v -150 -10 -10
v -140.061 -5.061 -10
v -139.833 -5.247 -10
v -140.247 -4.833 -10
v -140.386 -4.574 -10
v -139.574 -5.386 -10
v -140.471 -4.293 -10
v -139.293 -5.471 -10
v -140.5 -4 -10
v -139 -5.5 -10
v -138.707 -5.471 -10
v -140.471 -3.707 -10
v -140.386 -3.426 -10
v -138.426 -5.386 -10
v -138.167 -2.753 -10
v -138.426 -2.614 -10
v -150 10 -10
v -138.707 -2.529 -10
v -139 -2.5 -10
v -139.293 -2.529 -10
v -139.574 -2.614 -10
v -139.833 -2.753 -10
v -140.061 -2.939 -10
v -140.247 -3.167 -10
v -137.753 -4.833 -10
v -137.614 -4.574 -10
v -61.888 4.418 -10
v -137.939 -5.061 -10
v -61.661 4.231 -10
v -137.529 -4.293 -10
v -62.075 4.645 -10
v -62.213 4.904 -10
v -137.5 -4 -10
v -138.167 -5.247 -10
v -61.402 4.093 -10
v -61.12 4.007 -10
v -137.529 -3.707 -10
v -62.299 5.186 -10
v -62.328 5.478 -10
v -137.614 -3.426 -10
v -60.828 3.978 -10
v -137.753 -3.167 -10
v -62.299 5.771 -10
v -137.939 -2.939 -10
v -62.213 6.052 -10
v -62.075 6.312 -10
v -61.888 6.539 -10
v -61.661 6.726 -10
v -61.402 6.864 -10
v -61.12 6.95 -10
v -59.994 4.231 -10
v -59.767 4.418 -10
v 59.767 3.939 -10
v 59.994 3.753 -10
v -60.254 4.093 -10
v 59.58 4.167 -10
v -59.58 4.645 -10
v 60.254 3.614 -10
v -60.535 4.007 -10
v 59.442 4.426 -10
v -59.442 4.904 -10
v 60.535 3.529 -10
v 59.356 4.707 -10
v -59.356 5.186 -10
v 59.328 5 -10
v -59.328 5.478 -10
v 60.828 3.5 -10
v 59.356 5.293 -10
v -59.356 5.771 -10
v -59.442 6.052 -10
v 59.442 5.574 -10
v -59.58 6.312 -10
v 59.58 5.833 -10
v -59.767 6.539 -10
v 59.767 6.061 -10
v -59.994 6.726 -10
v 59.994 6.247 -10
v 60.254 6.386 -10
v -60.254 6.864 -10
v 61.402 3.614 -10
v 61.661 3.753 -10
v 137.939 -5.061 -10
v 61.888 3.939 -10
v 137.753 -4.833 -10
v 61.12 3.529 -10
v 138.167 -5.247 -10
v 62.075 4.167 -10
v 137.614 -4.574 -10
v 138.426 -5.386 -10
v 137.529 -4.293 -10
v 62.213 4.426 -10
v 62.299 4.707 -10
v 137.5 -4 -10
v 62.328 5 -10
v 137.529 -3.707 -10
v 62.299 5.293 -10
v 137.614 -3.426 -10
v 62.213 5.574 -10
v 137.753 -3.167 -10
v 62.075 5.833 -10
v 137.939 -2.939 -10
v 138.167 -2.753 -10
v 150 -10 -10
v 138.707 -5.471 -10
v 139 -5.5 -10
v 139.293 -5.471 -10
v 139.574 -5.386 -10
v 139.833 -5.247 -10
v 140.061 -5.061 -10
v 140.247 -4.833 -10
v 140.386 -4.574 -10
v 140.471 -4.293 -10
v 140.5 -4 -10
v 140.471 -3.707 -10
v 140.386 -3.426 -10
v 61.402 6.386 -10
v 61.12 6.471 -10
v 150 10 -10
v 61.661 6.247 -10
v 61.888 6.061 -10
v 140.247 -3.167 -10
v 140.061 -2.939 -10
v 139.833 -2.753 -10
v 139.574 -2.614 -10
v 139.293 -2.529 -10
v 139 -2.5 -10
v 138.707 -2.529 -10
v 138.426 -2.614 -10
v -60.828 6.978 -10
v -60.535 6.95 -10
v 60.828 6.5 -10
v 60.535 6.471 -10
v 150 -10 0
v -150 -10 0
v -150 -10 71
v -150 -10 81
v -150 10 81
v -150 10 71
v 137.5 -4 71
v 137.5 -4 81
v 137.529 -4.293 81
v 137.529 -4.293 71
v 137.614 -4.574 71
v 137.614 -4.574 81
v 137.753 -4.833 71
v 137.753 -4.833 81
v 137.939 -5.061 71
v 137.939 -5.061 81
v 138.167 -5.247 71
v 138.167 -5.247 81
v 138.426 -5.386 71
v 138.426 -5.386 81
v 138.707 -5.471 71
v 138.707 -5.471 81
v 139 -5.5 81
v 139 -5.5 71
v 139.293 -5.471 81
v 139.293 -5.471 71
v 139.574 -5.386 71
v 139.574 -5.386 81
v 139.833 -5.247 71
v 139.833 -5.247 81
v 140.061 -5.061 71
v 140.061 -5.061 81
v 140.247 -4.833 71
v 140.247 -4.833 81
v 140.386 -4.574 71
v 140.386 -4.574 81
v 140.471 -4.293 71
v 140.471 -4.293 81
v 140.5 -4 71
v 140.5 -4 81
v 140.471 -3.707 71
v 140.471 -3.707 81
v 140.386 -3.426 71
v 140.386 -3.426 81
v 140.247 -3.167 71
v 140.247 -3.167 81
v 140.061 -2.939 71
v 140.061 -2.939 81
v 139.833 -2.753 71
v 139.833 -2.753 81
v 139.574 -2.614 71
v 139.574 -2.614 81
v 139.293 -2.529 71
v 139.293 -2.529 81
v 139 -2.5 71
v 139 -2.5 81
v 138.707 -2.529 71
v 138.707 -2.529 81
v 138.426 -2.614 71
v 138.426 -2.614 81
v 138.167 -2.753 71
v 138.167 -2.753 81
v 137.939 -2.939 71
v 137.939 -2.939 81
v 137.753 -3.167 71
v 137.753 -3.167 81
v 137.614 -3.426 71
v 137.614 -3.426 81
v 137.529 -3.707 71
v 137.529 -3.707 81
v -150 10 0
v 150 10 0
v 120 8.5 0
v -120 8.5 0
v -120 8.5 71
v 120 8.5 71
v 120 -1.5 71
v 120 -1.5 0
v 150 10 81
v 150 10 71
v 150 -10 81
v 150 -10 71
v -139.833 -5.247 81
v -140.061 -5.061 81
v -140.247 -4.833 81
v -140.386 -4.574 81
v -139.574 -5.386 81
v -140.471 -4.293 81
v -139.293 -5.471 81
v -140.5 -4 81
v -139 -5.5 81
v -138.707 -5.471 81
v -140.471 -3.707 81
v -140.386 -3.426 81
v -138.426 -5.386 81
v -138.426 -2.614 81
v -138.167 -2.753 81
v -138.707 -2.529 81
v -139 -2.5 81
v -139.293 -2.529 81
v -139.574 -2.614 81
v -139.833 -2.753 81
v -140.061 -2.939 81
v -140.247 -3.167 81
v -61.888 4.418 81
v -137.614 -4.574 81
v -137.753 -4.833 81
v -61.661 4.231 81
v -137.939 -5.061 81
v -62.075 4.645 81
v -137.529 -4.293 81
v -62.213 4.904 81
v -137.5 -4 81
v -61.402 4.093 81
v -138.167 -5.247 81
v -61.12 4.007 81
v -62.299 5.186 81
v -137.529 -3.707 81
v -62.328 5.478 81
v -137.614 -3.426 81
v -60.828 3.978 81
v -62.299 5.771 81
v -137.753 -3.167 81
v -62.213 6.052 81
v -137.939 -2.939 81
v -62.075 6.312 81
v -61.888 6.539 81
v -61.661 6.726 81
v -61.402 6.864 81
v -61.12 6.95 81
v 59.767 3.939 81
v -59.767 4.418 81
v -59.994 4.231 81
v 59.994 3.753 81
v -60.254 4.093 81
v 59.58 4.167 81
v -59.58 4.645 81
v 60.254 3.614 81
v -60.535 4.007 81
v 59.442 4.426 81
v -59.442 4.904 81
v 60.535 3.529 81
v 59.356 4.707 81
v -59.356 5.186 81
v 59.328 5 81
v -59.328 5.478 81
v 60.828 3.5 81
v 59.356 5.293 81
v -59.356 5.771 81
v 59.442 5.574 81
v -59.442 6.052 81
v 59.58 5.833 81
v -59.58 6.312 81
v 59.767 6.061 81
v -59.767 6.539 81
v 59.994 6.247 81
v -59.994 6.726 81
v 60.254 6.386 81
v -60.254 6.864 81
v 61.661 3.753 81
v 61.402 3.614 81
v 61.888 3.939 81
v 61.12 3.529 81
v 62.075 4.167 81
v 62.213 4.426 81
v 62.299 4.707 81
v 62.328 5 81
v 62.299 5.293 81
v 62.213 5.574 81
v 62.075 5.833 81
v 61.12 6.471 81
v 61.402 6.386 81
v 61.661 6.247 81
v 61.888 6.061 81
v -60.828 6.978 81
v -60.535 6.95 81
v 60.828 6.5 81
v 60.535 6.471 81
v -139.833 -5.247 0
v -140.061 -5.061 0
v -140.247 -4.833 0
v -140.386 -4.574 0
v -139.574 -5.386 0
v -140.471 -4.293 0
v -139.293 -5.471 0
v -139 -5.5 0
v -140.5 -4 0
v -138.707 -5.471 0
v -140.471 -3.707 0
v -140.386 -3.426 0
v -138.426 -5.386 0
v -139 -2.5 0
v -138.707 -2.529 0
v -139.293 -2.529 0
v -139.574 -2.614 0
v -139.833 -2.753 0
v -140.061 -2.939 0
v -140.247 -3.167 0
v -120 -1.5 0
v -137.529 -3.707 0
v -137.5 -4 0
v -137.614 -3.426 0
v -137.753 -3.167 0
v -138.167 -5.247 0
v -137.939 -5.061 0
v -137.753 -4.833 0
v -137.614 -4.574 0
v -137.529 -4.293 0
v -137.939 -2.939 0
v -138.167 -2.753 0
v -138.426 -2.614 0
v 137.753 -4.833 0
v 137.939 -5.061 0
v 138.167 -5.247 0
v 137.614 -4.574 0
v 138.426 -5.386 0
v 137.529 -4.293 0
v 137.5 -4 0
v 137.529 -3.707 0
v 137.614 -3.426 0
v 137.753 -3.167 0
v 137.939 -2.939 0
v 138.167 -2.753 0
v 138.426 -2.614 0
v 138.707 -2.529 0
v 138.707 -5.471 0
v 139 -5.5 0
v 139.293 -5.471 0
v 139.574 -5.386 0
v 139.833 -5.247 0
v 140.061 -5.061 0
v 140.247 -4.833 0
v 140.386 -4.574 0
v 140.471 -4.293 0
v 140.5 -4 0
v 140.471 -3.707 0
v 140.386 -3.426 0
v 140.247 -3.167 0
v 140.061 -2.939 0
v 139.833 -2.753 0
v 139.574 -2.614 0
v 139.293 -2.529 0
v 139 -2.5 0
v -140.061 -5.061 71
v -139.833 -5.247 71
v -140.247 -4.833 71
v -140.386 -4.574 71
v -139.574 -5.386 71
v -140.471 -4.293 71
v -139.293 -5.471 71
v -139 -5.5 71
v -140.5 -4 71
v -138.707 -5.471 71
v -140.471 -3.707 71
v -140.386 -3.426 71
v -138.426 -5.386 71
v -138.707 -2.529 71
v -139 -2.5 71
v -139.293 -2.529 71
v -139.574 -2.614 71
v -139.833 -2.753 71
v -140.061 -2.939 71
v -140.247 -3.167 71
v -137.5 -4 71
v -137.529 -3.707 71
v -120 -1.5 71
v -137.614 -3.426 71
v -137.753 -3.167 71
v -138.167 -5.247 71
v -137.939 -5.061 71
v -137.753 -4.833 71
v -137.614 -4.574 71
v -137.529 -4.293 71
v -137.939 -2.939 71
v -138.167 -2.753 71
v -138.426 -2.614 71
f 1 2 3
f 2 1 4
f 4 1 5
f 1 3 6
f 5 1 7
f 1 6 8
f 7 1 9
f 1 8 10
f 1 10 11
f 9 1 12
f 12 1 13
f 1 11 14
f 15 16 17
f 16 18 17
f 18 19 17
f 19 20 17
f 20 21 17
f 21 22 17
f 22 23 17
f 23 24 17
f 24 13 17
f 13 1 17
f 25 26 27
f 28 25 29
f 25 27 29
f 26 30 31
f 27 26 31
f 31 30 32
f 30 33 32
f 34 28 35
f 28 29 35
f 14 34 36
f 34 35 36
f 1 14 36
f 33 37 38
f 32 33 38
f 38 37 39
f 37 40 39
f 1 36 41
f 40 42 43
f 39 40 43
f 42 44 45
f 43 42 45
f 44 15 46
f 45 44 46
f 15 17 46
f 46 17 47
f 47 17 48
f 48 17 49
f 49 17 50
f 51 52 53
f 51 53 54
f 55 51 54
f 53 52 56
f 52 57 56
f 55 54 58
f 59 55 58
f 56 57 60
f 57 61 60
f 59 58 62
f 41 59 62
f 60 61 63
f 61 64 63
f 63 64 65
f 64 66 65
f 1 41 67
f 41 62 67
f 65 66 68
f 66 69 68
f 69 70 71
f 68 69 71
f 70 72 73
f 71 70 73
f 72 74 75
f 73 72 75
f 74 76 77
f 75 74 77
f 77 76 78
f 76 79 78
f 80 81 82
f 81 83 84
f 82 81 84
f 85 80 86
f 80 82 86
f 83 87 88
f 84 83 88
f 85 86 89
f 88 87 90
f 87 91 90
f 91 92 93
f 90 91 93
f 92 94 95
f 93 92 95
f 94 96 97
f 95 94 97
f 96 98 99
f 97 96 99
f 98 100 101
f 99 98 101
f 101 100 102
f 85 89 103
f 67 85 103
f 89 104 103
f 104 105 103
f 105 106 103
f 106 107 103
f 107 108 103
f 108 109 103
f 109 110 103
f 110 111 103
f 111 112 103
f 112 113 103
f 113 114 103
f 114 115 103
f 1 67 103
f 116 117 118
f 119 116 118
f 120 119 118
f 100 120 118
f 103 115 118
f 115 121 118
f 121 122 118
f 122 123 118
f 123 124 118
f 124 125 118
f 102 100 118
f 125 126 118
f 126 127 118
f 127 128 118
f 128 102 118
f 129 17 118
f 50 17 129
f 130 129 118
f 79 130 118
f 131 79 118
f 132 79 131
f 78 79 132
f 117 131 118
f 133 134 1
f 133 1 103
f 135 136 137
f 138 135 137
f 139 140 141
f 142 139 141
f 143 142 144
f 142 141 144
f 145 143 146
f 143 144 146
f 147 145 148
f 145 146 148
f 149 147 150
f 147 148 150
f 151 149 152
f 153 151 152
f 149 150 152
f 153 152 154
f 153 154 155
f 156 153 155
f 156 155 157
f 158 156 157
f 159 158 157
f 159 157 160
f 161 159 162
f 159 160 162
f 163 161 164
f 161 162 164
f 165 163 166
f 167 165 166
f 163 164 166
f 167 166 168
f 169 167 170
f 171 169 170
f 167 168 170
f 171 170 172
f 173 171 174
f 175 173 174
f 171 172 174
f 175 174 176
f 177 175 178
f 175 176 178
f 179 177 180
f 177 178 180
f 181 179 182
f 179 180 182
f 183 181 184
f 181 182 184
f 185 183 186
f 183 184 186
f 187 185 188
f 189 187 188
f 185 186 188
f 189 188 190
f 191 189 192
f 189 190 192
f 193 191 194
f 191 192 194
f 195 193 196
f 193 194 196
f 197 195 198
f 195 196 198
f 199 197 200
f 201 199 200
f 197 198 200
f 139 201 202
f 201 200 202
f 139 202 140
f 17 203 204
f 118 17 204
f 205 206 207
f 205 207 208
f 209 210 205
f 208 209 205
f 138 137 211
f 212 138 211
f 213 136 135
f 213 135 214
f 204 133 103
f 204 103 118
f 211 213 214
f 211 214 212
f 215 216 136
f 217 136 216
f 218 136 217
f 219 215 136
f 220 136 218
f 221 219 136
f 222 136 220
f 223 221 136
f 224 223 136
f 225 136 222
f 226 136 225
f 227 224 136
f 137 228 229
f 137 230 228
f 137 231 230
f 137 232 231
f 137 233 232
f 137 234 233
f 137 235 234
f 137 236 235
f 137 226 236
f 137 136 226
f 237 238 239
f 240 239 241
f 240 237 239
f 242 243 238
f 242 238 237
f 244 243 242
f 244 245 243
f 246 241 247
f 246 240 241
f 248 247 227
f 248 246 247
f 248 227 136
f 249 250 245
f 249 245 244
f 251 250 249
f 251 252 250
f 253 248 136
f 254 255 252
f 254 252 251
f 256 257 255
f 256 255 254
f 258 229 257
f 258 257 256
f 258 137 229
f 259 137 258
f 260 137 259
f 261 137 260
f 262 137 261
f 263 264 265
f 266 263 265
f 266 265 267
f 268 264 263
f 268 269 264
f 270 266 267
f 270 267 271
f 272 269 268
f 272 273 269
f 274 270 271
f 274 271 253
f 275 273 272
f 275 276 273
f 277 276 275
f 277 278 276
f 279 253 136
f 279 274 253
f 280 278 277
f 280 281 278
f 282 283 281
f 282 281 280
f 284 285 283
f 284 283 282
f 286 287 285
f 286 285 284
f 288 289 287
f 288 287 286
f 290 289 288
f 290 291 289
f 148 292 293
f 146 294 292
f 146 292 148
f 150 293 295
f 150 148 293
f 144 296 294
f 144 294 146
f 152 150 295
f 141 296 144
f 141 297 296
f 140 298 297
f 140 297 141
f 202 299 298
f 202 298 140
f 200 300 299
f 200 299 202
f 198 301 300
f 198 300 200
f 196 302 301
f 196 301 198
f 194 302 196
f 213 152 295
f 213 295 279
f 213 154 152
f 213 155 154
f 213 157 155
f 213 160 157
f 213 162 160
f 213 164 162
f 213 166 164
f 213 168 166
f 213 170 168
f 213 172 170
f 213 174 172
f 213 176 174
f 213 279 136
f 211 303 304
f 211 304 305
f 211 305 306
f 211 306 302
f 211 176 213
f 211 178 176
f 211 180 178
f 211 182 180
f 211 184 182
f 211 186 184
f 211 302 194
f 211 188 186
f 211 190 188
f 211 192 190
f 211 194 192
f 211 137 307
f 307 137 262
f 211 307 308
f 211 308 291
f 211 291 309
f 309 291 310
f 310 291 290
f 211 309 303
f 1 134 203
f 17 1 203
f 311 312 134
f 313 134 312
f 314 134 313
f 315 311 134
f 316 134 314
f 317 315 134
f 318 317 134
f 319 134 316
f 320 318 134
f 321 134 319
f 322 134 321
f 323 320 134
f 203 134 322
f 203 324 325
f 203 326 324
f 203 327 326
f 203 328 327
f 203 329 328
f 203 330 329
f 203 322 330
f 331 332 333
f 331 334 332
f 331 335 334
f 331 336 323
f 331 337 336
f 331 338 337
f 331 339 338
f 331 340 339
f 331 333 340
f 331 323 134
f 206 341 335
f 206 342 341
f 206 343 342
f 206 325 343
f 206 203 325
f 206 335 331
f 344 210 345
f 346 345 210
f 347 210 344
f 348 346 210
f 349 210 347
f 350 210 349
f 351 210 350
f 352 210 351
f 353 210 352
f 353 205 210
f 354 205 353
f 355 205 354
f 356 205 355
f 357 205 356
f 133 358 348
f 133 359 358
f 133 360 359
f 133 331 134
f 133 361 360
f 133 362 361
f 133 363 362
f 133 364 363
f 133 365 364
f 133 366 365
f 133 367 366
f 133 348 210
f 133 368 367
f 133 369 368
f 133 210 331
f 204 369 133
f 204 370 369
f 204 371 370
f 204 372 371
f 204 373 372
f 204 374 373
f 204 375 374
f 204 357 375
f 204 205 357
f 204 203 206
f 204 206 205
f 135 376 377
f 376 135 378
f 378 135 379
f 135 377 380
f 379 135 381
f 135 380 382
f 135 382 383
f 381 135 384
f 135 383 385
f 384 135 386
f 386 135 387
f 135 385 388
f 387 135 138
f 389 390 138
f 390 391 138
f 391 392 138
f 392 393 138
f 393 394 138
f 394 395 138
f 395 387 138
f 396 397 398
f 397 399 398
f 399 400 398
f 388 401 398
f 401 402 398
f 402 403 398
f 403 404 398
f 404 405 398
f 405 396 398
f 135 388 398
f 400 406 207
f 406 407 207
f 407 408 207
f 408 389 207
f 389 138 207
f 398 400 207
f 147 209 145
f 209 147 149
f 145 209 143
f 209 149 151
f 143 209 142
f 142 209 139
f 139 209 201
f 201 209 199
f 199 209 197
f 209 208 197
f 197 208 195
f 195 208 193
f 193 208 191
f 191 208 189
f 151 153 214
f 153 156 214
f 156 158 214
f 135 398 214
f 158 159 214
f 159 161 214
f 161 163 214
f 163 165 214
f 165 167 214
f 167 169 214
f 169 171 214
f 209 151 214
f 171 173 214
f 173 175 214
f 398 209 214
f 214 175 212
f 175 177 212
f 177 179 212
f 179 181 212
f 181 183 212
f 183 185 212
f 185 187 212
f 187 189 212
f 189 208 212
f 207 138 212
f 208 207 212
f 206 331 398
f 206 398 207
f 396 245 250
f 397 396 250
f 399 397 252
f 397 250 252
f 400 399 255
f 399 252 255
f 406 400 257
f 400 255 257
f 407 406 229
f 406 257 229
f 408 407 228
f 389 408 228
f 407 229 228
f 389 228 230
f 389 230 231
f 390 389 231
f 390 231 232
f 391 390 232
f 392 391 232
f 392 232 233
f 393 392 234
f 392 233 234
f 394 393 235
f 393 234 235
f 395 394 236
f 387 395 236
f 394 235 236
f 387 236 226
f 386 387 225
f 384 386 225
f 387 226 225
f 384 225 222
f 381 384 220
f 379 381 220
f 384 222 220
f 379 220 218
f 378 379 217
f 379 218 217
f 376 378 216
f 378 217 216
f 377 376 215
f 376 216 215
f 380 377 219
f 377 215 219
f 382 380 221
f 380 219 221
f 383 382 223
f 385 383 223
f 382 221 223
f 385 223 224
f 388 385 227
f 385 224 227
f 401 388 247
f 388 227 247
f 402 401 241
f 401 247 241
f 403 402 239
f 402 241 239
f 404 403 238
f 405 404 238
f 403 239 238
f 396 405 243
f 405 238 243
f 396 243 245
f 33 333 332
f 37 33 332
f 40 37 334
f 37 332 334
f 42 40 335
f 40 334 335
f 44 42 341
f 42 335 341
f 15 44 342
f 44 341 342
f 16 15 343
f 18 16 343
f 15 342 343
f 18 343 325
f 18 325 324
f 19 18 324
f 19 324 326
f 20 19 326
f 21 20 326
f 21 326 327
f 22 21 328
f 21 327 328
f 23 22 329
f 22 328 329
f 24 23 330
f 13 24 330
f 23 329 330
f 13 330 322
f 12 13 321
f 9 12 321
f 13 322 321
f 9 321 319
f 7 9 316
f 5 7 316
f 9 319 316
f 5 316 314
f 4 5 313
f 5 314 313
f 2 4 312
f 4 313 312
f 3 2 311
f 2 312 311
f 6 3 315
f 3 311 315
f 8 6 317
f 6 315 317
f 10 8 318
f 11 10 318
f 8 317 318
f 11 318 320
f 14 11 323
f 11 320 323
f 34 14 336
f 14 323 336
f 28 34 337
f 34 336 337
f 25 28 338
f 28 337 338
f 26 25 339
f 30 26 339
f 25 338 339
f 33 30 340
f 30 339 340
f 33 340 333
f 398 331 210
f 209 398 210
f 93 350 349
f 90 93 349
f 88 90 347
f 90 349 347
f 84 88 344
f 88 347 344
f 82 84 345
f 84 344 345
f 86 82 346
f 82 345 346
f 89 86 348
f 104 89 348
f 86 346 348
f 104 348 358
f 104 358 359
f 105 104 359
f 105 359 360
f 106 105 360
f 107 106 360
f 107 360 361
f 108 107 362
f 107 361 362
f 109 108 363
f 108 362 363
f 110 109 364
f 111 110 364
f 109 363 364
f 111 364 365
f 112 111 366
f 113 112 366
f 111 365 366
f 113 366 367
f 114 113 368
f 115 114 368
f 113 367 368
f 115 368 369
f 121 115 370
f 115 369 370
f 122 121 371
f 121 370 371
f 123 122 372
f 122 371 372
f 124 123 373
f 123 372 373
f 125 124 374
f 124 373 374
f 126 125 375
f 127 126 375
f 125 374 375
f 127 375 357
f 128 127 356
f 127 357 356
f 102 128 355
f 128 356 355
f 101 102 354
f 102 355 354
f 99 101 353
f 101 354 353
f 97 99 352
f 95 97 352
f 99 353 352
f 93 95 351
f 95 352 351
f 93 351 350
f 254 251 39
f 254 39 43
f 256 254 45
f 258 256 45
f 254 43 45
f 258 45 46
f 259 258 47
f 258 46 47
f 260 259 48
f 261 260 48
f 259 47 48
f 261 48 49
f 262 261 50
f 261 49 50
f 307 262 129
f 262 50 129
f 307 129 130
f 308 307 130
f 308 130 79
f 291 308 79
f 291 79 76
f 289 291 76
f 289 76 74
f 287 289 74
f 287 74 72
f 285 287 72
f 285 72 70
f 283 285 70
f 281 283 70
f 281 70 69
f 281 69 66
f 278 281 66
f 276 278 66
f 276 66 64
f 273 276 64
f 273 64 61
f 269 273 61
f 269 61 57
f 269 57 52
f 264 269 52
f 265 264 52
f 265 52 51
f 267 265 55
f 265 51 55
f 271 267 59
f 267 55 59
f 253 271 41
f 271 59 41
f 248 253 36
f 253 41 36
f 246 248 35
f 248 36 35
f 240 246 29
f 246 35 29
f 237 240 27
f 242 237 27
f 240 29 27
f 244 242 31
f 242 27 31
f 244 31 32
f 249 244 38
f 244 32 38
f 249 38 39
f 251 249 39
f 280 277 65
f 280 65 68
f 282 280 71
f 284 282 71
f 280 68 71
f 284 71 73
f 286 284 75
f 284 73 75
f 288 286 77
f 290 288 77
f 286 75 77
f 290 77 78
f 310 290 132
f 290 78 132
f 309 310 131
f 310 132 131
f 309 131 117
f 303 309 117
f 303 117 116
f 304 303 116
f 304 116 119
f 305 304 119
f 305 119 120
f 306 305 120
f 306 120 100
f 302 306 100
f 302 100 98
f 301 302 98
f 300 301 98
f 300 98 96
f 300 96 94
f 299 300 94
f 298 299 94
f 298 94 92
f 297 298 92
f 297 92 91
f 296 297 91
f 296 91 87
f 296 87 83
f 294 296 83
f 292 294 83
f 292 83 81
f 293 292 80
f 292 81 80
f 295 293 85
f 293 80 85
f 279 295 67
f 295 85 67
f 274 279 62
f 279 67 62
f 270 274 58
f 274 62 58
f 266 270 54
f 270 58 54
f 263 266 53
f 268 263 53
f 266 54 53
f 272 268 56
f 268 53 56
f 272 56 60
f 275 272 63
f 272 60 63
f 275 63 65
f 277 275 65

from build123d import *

# Parameters (mm, degrees)
CROQUIS1_W              = 300
CROQUIS1_H              = 20
CROQUIS1_R              = 1.5
SALIENTE_EXTRUIR1_DEPTH = 10
CROQUIS2_W              = 240
CROQUIS2_H              = 10
SALIENTE_EXTRUIR2_DEPTH = 71
SALIENTE_EXTRUIR3_START = 10
CROQUIS3_W              = 300
CROQUIS3_H              = 20
CROQUIS3_R              = 1.5
SALIENTE_EXTRUIR3_DEPTH = 10
CROQUIS6_R              = 1.5
CORTAR_EXTRUIR1_DEPTH   = 176.72990639


with BuildPart() as part:
    # Croquis1 → Saliente-Extruir1 (new body)
    with BuildSketch(Plane.XY):
        Rectangle(CROQUIS1_W, CROQUIS1_H)
        with Locations((-139, -4)):
            Circle(CROQUIS1_R, mode=Mode.SUBTRACT)
        with Locations(Location((139, -4, 0), (0, 0, 180))):
            Circle(CROQUIS1_R, mode=Mode.SUBTRACT)
    extrude(amount=-SALIENTE_EXTRUIR1_DEPTH)

    # Croquis2 → Saliente-Extruir2 (add)
    with BuildSketch(Plane.XY):
        with Locations((0, 3.5)):
            Rectangle(CROQUIS2_W, CROQUIS2_H)
    extrude(amount=SALIENTE_EXTRUIR2_DEPTH)

    # Croquis3 → Saliente-Extruir3 (add)
    with BuildSketch(Plane.XY.offset(71).offset(SALIENTE_EXTRUIR3_START)):
        Rectangle(CROQUIS3_W, CROQUIS3_H)
        with Locations((-139, -4)):
            Circle(CROQUIS3_R, mode=Mode.SUBTRACT)
        with Locations(Location((139, -4, 0), (0, 0, 180))):
            Circle(CROQUIS3_R, mode=Mode.SUBTRACT)
    extrude(amount=-SALIENTE_EXTRUIR3_DEPTH)

    # Croquis6 → Cortar-Extruir1 (cut, through all)
    with BuildSketch(Plane(origin=(0, 0, -10), x_dir=(-1, 0, 0), z_dir=(0, 0, -1))):
        with Locations((-60.8276255, 5)):
            Circle(CROQUIS6_R)
        with Locations((60.827625106, 5.478335841)):
            Circle(CROQUIS6_R)
    extrude(amount=-CORTAR_EXTRUIR1_DEPTH, mode=Mode.SUBTRACT)


solid = part.part
